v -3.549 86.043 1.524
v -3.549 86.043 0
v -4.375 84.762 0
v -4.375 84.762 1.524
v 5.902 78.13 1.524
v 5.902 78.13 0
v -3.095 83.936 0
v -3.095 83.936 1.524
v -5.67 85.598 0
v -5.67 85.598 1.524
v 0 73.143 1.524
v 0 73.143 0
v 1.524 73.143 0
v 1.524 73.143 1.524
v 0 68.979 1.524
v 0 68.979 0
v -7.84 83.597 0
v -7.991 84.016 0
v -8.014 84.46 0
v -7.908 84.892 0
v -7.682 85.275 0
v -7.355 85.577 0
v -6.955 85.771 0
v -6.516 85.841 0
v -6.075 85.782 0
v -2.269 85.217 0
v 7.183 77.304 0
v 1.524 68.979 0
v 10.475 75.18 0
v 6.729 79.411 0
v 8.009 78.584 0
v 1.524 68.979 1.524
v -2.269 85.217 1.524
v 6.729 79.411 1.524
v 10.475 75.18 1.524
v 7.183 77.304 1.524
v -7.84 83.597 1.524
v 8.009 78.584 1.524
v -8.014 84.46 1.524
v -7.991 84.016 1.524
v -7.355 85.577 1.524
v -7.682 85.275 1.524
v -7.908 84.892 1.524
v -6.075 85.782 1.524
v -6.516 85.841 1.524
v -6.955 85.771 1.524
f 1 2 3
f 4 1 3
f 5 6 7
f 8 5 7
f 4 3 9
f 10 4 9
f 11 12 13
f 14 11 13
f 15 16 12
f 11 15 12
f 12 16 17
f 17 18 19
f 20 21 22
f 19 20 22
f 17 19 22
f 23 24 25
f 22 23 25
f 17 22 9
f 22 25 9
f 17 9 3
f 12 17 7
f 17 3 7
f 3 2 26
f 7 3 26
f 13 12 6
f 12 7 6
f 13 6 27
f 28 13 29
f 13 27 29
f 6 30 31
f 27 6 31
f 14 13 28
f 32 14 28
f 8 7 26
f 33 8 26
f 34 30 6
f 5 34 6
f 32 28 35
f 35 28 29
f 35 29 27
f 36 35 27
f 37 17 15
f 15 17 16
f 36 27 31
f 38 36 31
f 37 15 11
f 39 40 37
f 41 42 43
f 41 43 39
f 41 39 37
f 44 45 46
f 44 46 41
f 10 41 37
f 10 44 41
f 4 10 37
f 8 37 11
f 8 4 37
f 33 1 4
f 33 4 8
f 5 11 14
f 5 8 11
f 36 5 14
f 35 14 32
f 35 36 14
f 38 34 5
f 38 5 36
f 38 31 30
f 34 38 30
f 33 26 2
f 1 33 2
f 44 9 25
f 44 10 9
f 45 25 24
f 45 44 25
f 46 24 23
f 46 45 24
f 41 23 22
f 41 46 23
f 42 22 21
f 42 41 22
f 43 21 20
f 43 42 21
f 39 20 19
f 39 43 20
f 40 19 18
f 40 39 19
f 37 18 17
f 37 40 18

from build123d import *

# Parameters (mm, degrees)
BOSS_EXTRUDE1_DEPTH = 1.524
FILLET1_R           = 1.524


with BuildPart() as part:
    # Sketch1 → Boss-Extrude1 (new body)
    with BuildSketch(Plane.XY):
        Polygon((0, 73.143262765), (1.524, 73.143262765), (1.524, 68.978612676), (10.474816324, 75.179605793), (7.183025054, 77.303792749), (8.009350184, 78.584324974), (6.728817959, 79.410650105), (5.902492829, 78.13011788), (-3.0948828, 83.93610811), (-2.26855767, 85.216640335), (-3.549089895, 86.042965466), (-4.375415025, 84.762433241), (-10.628767588, 88.797710347), (0, 68.978612676), align=None)
    extrude(amount=BOSS_EXTRUDE1_DEPTH)

    # Fillet1
    fillet1_edges = [part.edges().sort_by_distance(p)[0] for p in [
        (-10.628767588, 88.797710347, 0.762),
    ]]
    fillet(fillet1_edges, radius=FILLET1_R)


solid = part.part
